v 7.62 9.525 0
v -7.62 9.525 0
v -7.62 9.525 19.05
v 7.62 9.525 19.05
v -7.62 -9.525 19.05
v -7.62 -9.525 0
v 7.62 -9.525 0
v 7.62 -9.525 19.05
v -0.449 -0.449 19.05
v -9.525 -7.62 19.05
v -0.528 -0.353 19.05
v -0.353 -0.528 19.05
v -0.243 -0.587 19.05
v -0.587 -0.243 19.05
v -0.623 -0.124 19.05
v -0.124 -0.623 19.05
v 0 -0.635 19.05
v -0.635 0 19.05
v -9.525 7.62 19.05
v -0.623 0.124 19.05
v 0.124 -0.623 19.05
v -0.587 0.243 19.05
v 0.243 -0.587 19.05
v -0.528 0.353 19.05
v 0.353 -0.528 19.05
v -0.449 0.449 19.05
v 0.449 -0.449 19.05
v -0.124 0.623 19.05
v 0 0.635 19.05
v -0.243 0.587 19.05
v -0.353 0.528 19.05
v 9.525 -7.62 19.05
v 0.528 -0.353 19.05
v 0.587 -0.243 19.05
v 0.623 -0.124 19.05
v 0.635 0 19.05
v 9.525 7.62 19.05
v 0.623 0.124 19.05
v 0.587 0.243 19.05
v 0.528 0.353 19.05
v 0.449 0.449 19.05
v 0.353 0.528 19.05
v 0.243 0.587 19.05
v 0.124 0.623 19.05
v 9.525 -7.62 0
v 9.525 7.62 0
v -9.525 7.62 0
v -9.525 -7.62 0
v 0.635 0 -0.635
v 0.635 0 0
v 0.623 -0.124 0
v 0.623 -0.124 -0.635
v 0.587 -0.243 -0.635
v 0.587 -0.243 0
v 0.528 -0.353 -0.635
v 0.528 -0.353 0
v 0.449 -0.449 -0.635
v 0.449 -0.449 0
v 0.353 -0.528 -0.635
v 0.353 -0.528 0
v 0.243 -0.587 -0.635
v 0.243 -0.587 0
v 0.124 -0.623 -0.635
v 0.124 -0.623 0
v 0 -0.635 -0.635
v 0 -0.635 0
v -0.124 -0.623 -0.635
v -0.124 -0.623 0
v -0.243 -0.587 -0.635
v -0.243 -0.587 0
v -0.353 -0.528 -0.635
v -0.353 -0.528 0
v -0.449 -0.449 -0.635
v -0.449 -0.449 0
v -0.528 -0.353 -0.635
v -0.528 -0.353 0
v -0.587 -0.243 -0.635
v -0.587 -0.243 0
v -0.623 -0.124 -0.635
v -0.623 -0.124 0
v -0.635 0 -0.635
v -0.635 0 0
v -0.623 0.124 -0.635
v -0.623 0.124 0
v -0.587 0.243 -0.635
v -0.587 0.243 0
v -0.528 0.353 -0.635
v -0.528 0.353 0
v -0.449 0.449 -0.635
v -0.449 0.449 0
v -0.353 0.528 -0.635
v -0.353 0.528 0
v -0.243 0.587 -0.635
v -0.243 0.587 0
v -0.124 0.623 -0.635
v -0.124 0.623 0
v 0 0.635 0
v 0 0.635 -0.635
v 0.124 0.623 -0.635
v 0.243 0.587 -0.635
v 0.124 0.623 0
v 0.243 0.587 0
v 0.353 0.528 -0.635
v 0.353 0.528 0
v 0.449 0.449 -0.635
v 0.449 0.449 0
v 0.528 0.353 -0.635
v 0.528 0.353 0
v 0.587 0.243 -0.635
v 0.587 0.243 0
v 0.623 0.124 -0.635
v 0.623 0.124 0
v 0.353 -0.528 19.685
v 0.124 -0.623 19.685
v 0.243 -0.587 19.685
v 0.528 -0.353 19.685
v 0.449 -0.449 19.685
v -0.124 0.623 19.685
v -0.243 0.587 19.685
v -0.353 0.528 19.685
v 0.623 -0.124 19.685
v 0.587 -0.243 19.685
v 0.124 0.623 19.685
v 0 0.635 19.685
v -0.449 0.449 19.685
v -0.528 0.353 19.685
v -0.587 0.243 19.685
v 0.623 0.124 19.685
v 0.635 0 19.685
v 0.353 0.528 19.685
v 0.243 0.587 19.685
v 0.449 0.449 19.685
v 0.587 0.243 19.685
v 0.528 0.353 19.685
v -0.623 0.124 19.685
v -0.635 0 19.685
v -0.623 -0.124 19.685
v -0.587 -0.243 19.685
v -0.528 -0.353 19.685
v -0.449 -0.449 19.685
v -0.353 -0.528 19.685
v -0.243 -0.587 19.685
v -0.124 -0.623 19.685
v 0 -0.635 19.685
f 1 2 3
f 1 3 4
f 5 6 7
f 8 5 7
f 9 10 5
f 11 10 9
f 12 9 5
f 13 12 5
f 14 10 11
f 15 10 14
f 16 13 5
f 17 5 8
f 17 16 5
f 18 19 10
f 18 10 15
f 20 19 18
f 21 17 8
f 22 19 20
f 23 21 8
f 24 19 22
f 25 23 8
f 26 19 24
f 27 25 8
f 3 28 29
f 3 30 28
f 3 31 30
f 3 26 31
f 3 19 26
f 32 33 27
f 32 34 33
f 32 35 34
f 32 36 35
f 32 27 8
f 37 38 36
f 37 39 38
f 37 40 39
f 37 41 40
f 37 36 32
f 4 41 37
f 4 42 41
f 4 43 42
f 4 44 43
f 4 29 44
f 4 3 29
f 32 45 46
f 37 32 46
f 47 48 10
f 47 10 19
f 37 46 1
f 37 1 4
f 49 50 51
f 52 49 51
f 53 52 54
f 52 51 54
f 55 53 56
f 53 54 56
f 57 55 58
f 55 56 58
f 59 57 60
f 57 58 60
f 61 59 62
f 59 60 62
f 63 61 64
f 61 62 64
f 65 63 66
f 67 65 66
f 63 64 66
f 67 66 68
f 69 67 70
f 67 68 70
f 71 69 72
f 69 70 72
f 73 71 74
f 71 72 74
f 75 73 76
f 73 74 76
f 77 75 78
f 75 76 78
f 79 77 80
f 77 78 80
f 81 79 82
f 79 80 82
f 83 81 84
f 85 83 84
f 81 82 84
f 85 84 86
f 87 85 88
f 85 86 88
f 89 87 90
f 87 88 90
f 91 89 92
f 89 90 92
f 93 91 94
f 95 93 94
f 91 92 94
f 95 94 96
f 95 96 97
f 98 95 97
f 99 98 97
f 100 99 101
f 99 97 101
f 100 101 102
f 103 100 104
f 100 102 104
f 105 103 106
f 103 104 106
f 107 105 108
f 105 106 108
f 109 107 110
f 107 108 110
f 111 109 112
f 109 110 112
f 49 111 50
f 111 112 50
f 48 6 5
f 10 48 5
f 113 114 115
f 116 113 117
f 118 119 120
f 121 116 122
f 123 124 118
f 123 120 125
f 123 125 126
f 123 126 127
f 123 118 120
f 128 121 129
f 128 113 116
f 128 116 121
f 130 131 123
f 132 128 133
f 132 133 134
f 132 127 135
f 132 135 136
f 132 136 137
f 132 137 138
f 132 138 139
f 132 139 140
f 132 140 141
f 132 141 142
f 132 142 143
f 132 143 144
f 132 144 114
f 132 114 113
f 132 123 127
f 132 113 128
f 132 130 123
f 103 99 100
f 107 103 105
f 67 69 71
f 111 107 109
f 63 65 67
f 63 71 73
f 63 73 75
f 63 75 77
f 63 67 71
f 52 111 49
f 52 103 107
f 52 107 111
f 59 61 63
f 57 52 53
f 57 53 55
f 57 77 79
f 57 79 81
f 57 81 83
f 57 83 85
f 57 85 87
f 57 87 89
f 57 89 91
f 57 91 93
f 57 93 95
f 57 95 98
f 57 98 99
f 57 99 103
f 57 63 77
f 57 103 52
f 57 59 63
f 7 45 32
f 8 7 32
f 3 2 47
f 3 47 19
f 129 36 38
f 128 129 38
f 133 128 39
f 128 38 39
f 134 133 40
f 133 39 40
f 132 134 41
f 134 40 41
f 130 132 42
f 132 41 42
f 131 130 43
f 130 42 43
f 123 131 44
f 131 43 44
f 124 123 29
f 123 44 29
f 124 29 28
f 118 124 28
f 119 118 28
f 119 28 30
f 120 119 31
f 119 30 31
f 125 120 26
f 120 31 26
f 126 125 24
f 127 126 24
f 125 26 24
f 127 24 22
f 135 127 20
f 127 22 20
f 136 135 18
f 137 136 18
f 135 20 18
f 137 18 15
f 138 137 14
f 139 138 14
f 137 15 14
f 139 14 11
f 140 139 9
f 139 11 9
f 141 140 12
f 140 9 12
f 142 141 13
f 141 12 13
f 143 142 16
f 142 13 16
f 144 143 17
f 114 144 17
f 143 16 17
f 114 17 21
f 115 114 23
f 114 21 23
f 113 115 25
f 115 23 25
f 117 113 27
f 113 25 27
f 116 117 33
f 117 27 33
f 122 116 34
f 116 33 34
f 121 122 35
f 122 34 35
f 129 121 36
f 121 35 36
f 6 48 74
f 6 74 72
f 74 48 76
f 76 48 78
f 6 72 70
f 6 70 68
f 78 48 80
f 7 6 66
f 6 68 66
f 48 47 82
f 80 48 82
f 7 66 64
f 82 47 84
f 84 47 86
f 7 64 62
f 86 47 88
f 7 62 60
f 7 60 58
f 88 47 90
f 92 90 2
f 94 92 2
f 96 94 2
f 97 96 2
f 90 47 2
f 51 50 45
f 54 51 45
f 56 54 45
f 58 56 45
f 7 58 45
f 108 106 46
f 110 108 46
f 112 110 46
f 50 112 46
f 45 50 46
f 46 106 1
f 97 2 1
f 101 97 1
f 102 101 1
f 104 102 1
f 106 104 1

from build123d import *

# Parameters (mm, degrees)
F0_W     = 19.05
F0_H     = 19.05
F1_DEPTH = 19.05
F2_R     = 0.635
F3_DEPTH = 0.635
F4_R     = 0.635
F5_DEPTH = 0.635
F6_SIZE  = 1.905


with BuildPart() as f1:
    # F0 (on Top) → F1 (new body)
    with BuildSketch(Plane.XY):
        Rectangle(F0_W, F0_H)
    extrude(amount=F1_DEPTH)

    # F2 (on face) → F3 (join)
    with BuildSketch(Plane.XY.offset(19.05)):
        Circle(F2_R)
    extrude(amount=F3_DEPTH)

    # F4 (on face) → F5 (join)
    with BuildSketch(Plane(origin=(0, 0, 0), x_dir=(1, 0, 0), z_dir=(0, 0, -1))):
        Circle(F4_R)
    extrude(amount=F5_DEPTH)

    # F6
    f6_edges = [f1.edges().sort_by_distance(p)[0] for p in [
        (-9.525, -9.525, 9.525),
        (9.525, -9.525, 9.525),
        (9.525, 9.525, 9.525),
        (-9.525, 9.525, 9.525),
    ]]
    chamfer(f6_edges, length=F6_SIZE)


solid = f1.part
